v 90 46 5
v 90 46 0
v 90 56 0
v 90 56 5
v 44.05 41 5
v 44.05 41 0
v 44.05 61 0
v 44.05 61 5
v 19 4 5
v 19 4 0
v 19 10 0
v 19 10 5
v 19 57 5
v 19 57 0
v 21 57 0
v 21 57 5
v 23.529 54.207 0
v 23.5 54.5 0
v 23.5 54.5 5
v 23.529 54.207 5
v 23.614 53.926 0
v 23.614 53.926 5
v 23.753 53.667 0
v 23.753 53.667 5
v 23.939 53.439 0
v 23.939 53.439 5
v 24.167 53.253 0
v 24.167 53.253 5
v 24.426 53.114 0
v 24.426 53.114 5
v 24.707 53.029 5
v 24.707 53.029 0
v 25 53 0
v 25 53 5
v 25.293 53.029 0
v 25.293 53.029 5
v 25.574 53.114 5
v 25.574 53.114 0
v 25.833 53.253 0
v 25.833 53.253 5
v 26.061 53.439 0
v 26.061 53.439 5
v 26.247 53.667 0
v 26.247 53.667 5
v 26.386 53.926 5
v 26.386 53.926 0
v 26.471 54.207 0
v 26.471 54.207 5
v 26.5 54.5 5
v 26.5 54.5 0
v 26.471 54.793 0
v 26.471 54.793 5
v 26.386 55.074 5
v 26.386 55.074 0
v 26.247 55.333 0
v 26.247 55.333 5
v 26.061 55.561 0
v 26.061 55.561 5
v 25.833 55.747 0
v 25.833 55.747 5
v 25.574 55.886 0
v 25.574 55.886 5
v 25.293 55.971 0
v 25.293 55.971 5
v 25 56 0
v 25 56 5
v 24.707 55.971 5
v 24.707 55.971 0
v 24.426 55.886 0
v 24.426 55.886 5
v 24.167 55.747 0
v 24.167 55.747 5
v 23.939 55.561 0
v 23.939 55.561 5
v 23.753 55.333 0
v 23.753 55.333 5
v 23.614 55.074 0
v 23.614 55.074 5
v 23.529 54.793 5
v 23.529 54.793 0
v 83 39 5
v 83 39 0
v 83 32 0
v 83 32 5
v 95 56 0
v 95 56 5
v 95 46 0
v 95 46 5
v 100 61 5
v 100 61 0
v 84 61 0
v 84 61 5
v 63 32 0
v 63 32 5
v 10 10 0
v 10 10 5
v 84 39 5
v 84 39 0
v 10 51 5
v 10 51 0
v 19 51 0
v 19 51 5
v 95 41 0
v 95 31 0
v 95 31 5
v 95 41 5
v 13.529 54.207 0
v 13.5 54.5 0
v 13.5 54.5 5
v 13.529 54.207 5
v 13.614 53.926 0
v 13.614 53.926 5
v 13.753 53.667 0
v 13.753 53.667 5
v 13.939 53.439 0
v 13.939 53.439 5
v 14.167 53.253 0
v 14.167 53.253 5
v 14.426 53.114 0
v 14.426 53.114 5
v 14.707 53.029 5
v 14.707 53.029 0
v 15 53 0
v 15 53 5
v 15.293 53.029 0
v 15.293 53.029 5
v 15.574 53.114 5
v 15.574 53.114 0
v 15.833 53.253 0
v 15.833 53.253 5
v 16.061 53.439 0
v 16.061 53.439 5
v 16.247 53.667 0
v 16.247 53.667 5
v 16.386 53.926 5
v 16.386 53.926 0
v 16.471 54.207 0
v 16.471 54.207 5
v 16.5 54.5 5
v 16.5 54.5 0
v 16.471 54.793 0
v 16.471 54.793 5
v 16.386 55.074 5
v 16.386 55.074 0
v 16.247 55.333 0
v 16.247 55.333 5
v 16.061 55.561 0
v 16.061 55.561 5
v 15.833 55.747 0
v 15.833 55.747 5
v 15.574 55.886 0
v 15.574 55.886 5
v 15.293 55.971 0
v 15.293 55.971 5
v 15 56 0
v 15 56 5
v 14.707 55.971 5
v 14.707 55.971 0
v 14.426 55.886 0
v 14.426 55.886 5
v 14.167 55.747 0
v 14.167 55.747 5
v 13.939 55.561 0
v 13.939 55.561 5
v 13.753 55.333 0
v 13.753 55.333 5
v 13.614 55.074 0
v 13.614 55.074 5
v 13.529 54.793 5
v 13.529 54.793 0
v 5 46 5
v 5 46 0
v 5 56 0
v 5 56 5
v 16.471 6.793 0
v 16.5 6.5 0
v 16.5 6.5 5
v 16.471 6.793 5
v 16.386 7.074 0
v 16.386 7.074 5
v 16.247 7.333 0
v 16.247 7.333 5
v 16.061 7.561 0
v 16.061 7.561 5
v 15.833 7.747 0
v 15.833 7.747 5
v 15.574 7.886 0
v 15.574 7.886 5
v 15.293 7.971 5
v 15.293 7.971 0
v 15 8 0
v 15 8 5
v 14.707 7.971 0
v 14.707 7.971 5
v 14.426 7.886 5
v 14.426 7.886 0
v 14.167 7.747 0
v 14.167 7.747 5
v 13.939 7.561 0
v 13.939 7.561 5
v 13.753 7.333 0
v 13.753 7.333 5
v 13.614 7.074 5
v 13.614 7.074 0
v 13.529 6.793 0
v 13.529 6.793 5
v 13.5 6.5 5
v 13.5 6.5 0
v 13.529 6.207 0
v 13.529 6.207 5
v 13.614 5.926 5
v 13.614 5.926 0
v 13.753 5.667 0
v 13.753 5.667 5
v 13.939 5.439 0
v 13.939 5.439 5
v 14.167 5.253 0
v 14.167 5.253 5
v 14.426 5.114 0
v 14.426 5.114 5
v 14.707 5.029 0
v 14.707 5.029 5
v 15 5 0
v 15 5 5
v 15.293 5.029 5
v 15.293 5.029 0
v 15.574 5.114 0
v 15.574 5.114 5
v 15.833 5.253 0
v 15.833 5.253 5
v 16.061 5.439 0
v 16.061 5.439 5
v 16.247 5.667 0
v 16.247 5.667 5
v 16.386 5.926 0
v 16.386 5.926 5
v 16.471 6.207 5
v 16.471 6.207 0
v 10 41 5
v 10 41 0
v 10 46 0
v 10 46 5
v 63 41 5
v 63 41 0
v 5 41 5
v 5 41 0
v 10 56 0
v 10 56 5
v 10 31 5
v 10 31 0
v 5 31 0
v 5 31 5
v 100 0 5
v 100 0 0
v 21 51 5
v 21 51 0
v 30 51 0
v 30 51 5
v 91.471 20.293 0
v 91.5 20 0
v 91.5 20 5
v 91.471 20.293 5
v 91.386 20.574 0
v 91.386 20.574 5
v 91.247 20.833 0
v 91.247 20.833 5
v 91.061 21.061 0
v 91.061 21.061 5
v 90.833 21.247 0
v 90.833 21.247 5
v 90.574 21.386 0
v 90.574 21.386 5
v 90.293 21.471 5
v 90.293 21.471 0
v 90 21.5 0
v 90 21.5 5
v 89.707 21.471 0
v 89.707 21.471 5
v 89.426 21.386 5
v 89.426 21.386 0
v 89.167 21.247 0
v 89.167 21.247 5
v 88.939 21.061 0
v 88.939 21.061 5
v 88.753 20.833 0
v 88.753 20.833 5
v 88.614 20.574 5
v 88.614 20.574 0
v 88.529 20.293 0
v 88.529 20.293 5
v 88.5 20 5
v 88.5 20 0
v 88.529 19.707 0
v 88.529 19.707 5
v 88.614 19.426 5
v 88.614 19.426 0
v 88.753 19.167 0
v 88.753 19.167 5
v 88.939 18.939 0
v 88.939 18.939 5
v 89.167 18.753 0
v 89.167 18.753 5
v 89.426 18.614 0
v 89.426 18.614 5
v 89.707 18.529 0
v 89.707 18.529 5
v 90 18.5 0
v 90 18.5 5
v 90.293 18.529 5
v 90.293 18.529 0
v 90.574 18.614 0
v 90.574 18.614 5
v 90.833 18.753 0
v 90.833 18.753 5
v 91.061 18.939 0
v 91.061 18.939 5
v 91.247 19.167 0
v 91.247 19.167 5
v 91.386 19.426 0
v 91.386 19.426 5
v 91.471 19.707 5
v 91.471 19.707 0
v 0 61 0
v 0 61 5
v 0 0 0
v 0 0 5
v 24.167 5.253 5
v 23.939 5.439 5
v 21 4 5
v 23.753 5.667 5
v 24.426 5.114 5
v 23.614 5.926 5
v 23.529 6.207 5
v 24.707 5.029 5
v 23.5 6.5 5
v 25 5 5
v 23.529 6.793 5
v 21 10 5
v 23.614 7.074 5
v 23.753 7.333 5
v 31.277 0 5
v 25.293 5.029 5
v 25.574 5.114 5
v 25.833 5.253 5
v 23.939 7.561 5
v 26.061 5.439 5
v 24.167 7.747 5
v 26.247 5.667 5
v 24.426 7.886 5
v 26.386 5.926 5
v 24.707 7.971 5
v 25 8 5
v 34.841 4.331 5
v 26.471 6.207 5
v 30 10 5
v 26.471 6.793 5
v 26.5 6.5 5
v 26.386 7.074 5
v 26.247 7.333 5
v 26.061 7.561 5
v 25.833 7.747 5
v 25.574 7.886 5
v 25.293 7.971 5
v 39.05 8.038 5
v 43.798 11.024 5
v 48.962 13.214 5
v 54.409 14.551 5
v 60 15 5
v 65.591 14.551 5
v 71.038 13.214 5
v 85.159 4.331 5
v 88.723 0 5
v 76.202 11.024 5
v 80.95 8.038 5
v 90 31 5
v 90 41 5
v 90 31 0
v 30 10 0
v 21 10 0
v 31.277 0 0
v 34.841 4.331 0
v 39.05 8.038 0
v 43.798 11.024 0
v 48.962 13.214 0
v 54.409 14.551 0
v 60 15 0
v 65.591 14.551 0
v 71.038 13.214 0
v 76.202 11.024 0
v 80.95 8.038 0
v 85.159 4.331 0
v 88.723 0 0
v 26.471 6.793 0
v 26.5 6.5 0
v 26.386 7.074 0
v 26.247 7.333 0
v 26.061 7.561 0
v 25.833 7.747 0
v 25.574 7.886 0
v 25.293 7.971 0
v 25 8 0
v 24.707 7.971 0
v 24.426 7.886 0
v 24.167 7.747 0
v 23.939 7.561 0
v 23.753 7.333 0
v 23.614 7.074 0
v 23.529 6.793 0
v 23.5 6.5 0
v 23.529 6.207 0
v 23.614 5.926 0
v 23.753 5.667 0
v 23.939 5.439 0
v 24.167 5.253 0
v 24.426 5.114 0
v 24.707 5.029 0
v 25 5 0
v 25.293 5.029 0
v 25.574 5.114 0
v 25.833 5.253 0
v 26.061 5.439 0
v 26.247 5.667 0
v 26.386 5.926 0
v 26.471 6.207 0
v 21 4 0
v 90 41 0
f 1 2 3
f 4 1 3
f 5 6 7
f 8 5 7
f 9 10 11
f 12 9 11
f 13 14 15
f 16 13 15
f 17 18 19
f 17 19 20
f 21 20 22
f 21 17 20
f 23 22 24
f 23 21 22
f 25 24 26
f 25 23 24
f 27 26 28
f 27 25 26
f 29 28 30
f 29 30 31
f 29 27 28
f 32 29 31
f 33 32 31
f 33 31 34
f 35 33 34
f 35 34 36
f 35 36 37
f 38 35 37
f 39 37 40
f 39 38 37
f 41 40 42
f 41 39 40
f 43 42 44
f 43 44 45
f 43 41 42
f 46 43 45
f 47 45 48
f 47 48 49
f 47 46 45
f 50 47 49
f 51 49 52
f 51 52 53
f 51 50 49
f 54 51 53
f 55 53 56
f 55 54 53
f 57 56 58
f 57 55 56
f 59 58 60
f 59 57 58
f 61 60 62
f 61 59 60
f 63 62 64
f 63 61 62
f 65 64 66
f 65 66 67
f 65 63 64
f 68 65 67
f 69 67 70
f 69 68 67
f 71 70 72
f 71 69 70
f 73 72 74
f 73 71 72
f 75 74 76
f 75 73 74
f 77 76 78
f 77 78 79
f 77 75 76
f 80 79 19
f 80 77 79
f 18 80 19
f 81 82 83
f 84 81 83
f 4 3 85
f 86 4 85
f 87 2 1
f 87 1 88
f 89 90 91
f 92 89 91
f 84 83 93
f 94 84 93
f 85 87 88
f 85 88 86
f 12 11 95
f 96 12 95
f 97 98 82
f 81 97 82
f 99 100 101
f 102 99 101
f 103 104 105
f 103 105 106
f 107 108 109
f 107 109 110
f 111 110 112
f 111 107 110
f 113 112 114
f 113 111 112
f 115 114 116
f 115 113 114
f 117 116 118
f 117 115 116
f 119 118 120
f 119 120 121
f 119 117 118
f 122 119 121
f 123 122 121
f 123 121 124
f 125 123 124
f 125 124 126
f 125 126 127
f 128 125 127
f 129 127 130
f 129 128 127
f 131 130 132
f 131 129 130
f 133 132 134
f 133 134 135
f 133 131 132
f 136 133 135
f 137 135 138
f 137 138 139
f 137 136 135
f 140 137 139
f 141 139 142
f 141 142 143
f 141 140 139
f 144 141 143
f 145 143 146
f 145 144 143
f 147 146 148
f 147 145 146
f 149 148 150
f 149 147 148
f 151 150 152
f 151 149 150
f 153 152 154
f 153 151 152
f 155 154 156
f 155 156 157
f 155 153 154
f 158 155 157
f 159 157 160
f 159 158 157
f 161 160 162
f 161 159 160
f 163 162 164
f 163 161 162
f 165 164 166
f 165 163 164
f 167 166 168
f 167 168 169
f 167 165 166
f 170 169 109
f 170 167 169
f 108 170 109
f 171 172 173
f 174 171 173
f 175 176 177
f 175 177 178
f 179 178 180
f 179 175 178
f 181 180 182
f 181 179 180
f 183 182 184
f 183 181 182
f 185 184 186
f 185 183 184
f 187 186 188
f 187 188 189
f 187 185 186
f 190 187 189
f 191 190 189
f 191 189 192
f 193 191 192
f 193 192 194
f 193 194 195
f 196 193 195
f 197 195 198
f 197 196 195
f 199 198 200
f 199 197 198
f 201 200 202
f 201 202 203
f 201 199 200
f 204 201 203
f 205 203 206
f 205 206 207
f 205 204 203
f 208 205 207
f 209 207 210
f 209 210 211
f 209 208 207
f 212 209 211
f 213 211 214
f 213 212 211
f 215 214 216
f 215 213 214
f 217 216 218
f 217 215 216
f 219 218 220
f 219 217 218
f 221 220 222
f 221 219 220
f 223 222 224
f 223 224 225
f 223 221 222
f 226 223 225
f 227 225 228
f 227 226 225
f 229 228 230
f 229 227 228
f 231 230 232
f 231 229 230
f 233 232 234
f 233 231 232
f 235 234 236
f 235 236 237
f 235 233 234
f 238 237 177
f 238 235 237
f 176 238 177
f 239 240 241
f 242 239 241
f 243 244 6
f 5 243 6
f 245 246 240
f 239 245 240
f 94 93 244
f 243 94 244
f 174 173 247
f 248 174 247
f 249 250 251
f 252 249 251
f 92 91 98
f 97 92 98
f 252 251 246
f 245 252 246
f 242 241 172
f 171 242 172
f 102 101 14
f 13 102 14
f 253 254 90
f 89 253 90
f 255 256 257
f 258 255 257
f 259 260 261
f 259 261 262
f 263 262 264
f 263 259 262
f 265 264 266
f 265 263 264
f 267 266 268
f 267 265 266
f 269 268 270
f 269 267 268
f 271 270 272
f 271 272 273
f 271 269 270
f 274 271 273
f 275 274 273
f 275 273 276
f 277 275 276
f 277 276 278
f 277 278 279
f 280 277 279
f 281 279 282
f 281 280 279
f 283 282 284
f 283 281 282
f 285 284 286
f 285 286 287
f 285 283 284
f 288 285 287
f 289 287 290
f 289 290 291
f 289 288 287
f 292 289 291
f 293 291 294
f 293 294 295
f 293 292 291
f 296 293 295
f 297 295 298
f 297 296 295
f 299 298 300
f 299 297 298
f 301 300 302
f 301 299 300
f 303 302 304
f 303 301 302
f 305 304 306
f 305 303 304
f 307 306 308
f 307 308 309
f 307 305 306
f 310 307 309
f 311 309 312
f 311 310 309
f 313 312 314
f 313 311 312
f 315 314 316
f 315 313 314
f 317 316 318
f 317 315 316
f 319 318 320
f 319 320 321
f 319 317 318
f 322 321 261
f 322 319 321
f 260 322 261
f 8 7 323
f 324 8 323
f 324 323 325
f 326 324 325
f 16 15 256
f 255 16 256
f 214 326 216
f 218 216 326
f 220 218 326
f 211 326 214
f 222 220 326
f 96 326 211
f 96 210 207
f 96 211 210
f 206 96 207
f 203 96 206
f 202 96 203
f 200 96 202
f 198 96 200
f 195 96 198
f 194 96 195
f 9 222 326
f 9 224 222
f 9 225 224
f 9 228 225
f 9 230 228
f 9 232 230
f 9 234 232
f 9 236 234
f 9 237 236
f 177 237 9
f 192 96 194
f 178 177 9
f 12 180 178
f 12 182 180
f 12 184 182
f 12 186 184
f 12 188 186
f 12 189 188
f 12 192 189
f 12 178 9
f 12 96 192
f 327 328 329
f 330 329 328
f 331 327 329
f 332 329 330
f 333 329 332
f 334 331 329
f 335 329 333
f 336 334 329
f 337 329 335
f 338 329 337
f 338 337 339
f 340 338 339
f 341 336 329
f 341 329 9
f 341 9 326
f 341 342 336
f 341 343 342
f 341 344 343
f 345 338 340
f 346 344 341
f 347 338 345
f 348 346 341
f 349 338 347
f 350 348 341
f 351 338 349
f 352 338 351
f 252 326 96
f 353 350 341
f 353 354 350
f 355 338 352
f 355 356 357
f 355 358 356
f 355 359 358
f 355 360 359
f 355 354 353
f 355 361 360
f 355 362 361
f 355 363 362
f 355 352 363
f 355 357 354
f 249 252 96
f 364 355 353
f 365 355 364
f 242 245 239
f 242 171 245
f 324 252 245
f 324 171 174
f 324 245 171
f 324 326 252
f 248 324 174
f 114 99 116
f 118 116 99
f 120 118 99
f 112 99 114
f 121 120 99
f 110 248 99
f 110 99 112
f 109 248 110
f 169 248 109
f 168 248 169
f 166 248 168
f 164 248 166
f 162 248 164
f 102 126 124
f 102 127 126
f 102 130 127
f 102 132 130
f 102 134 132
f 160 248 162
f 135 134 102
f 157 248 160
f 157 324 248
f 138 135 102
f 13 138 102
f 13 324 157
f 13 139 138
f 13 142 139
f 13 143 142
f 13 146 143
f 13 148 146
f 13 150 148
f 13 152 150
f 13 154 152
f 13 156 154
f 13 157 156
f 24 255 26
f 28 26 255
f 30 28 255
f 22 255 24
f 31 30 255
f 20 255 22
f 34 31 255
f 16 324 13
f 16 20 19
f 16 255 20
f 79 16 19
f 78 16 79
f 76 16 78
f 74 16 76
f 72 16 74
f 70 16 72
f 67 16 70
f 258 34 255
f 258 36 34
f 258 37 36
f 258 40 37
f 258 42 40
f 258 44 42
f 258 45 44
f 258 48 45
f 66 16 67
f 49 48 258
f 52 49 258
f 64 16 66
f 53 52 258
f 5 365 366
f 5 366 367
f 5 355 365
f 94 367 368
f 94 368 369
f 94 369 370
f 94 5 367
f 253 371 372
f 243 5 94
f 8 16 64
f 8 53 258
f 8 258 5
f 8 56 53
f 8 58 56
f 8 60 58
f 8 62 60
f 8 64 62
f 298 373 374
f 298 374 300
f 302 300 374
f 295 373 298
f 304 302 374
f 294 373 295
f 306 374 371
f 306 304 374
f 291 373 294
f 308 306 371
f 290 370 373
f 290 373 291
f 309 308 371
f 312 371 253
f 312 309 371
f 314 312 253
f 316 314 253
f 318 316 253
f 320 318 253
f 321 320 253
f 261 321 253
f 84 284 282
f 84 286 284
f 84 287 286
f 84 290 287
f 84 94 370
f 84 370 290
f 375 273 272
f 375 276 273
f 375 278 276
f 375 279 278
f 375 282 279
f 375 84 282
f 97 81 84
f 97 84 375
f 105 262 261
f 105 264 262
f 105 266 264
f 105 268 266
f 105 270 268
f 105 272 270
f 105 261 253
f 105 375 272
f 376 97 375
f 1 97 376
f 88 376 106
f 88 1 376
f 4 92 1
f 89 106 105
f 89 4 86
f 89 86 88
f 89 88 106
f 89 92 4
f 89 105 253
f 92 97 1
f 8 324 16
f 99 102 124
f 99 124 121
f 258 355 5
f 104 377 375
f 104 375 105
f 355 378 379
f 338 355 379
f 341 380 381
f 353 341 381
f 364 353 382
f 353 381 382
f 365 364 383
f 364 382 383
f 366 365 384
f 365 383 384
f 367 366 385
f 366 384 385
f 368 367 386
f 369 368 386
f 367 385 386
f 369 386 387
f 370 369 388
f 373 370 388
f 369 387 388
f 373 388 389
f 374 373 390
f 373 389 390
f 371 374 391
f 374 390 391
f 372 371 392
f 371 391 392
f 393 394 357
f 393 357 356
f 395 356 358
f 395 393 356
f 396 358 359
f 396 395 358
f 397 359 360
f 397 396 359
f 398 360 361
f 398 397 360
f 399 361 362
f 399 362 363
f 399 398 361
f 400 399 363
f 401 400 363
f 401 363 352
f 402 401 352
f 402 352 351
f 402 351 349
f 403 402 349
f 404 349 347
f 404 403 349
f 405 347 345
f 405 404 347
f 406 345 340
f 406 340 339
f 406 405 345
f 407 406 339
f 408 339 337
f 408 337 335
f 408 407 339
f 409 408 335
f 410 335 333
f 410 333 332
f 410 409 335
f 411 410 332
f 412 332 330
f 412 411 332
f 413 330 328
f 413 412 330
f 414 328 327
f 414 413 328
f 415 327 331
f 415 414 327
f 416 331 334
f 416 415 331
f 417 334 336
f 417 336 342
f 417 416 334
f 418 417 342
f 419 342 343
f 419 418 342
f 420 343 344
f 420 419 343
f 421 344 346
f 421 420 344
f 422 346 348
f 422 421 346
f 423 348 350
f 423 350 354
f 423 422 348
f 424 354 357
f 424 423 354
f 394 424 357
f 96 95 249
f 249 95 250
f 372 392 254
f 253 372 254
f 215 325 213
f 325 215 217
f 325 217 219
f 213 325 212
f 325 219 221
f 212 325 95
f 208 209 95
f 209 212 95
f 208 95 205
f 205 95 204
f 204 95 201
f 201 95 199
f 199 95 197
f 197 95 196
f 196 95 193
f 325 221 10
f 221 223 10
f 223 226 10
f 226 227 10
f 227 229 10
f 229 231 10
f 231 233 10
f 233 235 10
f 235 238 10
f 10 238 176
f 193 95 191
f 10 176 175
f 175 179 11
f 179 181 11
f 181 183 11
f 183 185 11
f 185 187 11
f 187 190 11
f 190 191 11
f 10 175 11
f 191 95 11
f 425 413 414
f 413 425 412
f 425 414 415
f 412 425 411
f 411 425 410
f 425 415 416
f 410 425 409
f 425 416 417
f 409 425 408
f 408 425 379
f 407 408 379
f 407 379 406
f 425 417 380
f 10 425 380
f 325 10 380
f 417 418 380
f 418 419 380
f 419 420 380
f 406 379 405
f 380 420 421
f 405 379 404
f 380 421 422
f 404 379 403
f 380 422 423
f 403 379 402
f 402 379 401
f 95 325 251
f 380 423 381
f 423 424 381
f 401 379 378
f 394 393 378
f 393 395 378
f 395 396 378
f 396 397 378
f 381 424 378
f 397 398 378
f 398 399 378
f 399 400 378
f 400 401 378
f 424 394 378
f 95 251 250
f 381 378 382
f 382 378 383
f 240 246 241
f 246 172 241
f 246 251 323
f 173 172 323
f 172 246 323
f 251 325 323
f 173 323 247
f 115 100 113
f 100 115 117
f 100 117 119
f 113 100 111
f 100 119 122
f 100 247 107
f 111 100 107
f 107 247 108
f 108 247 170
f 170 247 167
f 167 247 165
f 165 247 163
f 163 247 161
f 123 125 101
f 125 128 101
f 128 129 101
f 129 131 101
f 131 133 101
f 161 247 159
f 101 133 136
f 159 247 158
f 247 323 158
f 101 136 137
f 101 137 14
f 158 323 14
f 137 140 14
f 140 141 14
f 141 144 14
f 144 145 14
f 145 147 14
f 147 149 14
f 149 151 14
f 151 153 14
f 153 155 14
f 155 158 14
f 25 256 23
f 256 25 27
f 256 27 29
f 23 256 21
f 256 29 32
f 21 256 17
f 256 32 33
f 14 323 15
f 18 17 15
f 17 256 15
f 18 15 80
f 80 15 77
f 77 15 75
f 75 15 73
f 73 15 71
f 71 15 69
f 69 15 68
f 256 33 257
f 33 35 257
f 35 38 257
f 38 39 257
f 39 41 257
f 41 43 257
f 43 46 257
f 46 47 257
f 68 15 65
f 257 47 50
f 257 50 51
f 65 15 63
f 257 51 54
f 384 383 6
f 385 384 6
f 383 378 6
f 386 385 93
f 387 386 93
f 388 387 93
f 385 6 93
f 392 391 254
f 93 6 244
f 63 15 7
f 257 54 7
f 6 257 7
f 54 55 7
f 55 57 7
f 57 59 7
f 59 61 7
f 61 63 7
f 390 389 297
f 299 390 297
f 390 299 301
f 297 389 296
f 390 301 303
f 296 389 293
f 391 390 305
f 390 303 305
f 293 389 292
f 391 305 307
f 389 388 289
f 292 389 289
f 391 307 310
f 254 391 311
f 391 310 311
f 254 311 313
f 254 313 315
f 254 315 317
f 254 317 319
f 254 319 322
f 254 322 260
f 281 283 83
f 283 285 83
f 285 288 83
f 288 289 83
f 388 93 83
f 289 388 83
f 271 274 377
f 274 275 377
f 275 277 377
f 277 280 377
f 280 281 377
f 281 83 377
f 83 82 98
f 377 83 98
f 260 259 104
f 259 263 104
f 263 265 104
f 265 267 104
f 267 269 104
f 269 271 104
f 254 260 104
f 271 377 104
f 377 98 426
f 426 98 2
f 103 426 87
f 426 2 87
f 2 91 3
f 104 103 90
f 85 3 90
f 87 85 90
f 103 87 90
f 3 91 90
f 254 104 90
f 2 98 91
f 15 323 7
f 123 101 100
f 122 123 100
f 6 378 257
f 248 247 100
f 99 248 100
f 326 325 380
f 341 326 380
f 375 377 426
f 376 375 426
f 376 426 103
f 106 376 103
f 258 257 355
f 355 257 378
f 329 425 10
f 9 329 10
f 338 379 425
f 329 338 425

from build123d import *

# Parameters (mm, degrees)
ESQUISSE1_R        = 1.5
ESQUISSE1_W        = 5
ESQUISSE1_H        = 10
BOSS_EXTRU_1_DEPTH = 5


with BuildPart() as part:
    # Esquisse1 → Boss.-Extru.1 (new body)
    with BuildSketch(Plane.XY):
        with BuildLine():
            Line((0, 0), (31.277186767, 0))
            ThreePointArc((31.277186767, 0), (60, 15), (88.722813233, 0))
            Line((88.722813233, 0), (100, 0))
            Line((100, 0), (100, 61))
            Line((100, 61), (84, 61))
            Line((84, 61), (84, 39))
            Line((84, 39), (83, 39))
            Line((83, 39), (83, 32))
            Line((83, 32), (63, 32))
            Line((63, 32), (63, 41))
            Line((63, 41), (44.050031289, 41))
            Line((44.050031289, 41), (44.050031289, 61))
            Line((44.050031289, 61), (0, 61))
            Line((0, 61), (0, 0))
        make_face()
        with Locations((15, 6.5)):
            Circle(ESQUISSE1_R, mode=Mode.SUBTRACT)
        with Locations((25, 6.5)):
            Circle(ESQUISSE1_R, mode=Mode.SUBTRACT)
        with Locations(Location((25, 54.5, 0), (0, 0, 180))):
            Circle(ESQUISSE1_R, mode=Mode.SUBTRACT)
        with Locations(Location((15, 54.5, 0), (0, 0, 180))):
            Circle(ESQUISSE1_R, mode=Mode.SUBTRACT)
        with Locations((90, 20)):
            Circle(ESQUISSE1_R, mode=Mode.SUBTRACT)
        Polygon((10, 51), (19, 51), (19, 57), (21, 57), (21, 51), (30, 51), (30, 10), (21, 10), (21, 4), (19, 4), (19, 10), (10, 10), (10, 31), (5, 31), (5, 41), (10, 41), (10, 46), (5, 46), (5, 56), (10, 56), align=None, mode=Mode.SUBTRACT)
        with Locations((92.5, 51)):
            Rectangle(ESQUISSE1_W, ESQUISSE1_H, mode=Mode.SUBTRACT)
        with Locations((92.5, 36)):
            Rectangle(ESQUISSE1_W, ESQUISSE1_H, mode=Mode.SUBTRACT)
    extrude(amount=BOSS_EXTRU_1_DEPTH)


solid = part.part
